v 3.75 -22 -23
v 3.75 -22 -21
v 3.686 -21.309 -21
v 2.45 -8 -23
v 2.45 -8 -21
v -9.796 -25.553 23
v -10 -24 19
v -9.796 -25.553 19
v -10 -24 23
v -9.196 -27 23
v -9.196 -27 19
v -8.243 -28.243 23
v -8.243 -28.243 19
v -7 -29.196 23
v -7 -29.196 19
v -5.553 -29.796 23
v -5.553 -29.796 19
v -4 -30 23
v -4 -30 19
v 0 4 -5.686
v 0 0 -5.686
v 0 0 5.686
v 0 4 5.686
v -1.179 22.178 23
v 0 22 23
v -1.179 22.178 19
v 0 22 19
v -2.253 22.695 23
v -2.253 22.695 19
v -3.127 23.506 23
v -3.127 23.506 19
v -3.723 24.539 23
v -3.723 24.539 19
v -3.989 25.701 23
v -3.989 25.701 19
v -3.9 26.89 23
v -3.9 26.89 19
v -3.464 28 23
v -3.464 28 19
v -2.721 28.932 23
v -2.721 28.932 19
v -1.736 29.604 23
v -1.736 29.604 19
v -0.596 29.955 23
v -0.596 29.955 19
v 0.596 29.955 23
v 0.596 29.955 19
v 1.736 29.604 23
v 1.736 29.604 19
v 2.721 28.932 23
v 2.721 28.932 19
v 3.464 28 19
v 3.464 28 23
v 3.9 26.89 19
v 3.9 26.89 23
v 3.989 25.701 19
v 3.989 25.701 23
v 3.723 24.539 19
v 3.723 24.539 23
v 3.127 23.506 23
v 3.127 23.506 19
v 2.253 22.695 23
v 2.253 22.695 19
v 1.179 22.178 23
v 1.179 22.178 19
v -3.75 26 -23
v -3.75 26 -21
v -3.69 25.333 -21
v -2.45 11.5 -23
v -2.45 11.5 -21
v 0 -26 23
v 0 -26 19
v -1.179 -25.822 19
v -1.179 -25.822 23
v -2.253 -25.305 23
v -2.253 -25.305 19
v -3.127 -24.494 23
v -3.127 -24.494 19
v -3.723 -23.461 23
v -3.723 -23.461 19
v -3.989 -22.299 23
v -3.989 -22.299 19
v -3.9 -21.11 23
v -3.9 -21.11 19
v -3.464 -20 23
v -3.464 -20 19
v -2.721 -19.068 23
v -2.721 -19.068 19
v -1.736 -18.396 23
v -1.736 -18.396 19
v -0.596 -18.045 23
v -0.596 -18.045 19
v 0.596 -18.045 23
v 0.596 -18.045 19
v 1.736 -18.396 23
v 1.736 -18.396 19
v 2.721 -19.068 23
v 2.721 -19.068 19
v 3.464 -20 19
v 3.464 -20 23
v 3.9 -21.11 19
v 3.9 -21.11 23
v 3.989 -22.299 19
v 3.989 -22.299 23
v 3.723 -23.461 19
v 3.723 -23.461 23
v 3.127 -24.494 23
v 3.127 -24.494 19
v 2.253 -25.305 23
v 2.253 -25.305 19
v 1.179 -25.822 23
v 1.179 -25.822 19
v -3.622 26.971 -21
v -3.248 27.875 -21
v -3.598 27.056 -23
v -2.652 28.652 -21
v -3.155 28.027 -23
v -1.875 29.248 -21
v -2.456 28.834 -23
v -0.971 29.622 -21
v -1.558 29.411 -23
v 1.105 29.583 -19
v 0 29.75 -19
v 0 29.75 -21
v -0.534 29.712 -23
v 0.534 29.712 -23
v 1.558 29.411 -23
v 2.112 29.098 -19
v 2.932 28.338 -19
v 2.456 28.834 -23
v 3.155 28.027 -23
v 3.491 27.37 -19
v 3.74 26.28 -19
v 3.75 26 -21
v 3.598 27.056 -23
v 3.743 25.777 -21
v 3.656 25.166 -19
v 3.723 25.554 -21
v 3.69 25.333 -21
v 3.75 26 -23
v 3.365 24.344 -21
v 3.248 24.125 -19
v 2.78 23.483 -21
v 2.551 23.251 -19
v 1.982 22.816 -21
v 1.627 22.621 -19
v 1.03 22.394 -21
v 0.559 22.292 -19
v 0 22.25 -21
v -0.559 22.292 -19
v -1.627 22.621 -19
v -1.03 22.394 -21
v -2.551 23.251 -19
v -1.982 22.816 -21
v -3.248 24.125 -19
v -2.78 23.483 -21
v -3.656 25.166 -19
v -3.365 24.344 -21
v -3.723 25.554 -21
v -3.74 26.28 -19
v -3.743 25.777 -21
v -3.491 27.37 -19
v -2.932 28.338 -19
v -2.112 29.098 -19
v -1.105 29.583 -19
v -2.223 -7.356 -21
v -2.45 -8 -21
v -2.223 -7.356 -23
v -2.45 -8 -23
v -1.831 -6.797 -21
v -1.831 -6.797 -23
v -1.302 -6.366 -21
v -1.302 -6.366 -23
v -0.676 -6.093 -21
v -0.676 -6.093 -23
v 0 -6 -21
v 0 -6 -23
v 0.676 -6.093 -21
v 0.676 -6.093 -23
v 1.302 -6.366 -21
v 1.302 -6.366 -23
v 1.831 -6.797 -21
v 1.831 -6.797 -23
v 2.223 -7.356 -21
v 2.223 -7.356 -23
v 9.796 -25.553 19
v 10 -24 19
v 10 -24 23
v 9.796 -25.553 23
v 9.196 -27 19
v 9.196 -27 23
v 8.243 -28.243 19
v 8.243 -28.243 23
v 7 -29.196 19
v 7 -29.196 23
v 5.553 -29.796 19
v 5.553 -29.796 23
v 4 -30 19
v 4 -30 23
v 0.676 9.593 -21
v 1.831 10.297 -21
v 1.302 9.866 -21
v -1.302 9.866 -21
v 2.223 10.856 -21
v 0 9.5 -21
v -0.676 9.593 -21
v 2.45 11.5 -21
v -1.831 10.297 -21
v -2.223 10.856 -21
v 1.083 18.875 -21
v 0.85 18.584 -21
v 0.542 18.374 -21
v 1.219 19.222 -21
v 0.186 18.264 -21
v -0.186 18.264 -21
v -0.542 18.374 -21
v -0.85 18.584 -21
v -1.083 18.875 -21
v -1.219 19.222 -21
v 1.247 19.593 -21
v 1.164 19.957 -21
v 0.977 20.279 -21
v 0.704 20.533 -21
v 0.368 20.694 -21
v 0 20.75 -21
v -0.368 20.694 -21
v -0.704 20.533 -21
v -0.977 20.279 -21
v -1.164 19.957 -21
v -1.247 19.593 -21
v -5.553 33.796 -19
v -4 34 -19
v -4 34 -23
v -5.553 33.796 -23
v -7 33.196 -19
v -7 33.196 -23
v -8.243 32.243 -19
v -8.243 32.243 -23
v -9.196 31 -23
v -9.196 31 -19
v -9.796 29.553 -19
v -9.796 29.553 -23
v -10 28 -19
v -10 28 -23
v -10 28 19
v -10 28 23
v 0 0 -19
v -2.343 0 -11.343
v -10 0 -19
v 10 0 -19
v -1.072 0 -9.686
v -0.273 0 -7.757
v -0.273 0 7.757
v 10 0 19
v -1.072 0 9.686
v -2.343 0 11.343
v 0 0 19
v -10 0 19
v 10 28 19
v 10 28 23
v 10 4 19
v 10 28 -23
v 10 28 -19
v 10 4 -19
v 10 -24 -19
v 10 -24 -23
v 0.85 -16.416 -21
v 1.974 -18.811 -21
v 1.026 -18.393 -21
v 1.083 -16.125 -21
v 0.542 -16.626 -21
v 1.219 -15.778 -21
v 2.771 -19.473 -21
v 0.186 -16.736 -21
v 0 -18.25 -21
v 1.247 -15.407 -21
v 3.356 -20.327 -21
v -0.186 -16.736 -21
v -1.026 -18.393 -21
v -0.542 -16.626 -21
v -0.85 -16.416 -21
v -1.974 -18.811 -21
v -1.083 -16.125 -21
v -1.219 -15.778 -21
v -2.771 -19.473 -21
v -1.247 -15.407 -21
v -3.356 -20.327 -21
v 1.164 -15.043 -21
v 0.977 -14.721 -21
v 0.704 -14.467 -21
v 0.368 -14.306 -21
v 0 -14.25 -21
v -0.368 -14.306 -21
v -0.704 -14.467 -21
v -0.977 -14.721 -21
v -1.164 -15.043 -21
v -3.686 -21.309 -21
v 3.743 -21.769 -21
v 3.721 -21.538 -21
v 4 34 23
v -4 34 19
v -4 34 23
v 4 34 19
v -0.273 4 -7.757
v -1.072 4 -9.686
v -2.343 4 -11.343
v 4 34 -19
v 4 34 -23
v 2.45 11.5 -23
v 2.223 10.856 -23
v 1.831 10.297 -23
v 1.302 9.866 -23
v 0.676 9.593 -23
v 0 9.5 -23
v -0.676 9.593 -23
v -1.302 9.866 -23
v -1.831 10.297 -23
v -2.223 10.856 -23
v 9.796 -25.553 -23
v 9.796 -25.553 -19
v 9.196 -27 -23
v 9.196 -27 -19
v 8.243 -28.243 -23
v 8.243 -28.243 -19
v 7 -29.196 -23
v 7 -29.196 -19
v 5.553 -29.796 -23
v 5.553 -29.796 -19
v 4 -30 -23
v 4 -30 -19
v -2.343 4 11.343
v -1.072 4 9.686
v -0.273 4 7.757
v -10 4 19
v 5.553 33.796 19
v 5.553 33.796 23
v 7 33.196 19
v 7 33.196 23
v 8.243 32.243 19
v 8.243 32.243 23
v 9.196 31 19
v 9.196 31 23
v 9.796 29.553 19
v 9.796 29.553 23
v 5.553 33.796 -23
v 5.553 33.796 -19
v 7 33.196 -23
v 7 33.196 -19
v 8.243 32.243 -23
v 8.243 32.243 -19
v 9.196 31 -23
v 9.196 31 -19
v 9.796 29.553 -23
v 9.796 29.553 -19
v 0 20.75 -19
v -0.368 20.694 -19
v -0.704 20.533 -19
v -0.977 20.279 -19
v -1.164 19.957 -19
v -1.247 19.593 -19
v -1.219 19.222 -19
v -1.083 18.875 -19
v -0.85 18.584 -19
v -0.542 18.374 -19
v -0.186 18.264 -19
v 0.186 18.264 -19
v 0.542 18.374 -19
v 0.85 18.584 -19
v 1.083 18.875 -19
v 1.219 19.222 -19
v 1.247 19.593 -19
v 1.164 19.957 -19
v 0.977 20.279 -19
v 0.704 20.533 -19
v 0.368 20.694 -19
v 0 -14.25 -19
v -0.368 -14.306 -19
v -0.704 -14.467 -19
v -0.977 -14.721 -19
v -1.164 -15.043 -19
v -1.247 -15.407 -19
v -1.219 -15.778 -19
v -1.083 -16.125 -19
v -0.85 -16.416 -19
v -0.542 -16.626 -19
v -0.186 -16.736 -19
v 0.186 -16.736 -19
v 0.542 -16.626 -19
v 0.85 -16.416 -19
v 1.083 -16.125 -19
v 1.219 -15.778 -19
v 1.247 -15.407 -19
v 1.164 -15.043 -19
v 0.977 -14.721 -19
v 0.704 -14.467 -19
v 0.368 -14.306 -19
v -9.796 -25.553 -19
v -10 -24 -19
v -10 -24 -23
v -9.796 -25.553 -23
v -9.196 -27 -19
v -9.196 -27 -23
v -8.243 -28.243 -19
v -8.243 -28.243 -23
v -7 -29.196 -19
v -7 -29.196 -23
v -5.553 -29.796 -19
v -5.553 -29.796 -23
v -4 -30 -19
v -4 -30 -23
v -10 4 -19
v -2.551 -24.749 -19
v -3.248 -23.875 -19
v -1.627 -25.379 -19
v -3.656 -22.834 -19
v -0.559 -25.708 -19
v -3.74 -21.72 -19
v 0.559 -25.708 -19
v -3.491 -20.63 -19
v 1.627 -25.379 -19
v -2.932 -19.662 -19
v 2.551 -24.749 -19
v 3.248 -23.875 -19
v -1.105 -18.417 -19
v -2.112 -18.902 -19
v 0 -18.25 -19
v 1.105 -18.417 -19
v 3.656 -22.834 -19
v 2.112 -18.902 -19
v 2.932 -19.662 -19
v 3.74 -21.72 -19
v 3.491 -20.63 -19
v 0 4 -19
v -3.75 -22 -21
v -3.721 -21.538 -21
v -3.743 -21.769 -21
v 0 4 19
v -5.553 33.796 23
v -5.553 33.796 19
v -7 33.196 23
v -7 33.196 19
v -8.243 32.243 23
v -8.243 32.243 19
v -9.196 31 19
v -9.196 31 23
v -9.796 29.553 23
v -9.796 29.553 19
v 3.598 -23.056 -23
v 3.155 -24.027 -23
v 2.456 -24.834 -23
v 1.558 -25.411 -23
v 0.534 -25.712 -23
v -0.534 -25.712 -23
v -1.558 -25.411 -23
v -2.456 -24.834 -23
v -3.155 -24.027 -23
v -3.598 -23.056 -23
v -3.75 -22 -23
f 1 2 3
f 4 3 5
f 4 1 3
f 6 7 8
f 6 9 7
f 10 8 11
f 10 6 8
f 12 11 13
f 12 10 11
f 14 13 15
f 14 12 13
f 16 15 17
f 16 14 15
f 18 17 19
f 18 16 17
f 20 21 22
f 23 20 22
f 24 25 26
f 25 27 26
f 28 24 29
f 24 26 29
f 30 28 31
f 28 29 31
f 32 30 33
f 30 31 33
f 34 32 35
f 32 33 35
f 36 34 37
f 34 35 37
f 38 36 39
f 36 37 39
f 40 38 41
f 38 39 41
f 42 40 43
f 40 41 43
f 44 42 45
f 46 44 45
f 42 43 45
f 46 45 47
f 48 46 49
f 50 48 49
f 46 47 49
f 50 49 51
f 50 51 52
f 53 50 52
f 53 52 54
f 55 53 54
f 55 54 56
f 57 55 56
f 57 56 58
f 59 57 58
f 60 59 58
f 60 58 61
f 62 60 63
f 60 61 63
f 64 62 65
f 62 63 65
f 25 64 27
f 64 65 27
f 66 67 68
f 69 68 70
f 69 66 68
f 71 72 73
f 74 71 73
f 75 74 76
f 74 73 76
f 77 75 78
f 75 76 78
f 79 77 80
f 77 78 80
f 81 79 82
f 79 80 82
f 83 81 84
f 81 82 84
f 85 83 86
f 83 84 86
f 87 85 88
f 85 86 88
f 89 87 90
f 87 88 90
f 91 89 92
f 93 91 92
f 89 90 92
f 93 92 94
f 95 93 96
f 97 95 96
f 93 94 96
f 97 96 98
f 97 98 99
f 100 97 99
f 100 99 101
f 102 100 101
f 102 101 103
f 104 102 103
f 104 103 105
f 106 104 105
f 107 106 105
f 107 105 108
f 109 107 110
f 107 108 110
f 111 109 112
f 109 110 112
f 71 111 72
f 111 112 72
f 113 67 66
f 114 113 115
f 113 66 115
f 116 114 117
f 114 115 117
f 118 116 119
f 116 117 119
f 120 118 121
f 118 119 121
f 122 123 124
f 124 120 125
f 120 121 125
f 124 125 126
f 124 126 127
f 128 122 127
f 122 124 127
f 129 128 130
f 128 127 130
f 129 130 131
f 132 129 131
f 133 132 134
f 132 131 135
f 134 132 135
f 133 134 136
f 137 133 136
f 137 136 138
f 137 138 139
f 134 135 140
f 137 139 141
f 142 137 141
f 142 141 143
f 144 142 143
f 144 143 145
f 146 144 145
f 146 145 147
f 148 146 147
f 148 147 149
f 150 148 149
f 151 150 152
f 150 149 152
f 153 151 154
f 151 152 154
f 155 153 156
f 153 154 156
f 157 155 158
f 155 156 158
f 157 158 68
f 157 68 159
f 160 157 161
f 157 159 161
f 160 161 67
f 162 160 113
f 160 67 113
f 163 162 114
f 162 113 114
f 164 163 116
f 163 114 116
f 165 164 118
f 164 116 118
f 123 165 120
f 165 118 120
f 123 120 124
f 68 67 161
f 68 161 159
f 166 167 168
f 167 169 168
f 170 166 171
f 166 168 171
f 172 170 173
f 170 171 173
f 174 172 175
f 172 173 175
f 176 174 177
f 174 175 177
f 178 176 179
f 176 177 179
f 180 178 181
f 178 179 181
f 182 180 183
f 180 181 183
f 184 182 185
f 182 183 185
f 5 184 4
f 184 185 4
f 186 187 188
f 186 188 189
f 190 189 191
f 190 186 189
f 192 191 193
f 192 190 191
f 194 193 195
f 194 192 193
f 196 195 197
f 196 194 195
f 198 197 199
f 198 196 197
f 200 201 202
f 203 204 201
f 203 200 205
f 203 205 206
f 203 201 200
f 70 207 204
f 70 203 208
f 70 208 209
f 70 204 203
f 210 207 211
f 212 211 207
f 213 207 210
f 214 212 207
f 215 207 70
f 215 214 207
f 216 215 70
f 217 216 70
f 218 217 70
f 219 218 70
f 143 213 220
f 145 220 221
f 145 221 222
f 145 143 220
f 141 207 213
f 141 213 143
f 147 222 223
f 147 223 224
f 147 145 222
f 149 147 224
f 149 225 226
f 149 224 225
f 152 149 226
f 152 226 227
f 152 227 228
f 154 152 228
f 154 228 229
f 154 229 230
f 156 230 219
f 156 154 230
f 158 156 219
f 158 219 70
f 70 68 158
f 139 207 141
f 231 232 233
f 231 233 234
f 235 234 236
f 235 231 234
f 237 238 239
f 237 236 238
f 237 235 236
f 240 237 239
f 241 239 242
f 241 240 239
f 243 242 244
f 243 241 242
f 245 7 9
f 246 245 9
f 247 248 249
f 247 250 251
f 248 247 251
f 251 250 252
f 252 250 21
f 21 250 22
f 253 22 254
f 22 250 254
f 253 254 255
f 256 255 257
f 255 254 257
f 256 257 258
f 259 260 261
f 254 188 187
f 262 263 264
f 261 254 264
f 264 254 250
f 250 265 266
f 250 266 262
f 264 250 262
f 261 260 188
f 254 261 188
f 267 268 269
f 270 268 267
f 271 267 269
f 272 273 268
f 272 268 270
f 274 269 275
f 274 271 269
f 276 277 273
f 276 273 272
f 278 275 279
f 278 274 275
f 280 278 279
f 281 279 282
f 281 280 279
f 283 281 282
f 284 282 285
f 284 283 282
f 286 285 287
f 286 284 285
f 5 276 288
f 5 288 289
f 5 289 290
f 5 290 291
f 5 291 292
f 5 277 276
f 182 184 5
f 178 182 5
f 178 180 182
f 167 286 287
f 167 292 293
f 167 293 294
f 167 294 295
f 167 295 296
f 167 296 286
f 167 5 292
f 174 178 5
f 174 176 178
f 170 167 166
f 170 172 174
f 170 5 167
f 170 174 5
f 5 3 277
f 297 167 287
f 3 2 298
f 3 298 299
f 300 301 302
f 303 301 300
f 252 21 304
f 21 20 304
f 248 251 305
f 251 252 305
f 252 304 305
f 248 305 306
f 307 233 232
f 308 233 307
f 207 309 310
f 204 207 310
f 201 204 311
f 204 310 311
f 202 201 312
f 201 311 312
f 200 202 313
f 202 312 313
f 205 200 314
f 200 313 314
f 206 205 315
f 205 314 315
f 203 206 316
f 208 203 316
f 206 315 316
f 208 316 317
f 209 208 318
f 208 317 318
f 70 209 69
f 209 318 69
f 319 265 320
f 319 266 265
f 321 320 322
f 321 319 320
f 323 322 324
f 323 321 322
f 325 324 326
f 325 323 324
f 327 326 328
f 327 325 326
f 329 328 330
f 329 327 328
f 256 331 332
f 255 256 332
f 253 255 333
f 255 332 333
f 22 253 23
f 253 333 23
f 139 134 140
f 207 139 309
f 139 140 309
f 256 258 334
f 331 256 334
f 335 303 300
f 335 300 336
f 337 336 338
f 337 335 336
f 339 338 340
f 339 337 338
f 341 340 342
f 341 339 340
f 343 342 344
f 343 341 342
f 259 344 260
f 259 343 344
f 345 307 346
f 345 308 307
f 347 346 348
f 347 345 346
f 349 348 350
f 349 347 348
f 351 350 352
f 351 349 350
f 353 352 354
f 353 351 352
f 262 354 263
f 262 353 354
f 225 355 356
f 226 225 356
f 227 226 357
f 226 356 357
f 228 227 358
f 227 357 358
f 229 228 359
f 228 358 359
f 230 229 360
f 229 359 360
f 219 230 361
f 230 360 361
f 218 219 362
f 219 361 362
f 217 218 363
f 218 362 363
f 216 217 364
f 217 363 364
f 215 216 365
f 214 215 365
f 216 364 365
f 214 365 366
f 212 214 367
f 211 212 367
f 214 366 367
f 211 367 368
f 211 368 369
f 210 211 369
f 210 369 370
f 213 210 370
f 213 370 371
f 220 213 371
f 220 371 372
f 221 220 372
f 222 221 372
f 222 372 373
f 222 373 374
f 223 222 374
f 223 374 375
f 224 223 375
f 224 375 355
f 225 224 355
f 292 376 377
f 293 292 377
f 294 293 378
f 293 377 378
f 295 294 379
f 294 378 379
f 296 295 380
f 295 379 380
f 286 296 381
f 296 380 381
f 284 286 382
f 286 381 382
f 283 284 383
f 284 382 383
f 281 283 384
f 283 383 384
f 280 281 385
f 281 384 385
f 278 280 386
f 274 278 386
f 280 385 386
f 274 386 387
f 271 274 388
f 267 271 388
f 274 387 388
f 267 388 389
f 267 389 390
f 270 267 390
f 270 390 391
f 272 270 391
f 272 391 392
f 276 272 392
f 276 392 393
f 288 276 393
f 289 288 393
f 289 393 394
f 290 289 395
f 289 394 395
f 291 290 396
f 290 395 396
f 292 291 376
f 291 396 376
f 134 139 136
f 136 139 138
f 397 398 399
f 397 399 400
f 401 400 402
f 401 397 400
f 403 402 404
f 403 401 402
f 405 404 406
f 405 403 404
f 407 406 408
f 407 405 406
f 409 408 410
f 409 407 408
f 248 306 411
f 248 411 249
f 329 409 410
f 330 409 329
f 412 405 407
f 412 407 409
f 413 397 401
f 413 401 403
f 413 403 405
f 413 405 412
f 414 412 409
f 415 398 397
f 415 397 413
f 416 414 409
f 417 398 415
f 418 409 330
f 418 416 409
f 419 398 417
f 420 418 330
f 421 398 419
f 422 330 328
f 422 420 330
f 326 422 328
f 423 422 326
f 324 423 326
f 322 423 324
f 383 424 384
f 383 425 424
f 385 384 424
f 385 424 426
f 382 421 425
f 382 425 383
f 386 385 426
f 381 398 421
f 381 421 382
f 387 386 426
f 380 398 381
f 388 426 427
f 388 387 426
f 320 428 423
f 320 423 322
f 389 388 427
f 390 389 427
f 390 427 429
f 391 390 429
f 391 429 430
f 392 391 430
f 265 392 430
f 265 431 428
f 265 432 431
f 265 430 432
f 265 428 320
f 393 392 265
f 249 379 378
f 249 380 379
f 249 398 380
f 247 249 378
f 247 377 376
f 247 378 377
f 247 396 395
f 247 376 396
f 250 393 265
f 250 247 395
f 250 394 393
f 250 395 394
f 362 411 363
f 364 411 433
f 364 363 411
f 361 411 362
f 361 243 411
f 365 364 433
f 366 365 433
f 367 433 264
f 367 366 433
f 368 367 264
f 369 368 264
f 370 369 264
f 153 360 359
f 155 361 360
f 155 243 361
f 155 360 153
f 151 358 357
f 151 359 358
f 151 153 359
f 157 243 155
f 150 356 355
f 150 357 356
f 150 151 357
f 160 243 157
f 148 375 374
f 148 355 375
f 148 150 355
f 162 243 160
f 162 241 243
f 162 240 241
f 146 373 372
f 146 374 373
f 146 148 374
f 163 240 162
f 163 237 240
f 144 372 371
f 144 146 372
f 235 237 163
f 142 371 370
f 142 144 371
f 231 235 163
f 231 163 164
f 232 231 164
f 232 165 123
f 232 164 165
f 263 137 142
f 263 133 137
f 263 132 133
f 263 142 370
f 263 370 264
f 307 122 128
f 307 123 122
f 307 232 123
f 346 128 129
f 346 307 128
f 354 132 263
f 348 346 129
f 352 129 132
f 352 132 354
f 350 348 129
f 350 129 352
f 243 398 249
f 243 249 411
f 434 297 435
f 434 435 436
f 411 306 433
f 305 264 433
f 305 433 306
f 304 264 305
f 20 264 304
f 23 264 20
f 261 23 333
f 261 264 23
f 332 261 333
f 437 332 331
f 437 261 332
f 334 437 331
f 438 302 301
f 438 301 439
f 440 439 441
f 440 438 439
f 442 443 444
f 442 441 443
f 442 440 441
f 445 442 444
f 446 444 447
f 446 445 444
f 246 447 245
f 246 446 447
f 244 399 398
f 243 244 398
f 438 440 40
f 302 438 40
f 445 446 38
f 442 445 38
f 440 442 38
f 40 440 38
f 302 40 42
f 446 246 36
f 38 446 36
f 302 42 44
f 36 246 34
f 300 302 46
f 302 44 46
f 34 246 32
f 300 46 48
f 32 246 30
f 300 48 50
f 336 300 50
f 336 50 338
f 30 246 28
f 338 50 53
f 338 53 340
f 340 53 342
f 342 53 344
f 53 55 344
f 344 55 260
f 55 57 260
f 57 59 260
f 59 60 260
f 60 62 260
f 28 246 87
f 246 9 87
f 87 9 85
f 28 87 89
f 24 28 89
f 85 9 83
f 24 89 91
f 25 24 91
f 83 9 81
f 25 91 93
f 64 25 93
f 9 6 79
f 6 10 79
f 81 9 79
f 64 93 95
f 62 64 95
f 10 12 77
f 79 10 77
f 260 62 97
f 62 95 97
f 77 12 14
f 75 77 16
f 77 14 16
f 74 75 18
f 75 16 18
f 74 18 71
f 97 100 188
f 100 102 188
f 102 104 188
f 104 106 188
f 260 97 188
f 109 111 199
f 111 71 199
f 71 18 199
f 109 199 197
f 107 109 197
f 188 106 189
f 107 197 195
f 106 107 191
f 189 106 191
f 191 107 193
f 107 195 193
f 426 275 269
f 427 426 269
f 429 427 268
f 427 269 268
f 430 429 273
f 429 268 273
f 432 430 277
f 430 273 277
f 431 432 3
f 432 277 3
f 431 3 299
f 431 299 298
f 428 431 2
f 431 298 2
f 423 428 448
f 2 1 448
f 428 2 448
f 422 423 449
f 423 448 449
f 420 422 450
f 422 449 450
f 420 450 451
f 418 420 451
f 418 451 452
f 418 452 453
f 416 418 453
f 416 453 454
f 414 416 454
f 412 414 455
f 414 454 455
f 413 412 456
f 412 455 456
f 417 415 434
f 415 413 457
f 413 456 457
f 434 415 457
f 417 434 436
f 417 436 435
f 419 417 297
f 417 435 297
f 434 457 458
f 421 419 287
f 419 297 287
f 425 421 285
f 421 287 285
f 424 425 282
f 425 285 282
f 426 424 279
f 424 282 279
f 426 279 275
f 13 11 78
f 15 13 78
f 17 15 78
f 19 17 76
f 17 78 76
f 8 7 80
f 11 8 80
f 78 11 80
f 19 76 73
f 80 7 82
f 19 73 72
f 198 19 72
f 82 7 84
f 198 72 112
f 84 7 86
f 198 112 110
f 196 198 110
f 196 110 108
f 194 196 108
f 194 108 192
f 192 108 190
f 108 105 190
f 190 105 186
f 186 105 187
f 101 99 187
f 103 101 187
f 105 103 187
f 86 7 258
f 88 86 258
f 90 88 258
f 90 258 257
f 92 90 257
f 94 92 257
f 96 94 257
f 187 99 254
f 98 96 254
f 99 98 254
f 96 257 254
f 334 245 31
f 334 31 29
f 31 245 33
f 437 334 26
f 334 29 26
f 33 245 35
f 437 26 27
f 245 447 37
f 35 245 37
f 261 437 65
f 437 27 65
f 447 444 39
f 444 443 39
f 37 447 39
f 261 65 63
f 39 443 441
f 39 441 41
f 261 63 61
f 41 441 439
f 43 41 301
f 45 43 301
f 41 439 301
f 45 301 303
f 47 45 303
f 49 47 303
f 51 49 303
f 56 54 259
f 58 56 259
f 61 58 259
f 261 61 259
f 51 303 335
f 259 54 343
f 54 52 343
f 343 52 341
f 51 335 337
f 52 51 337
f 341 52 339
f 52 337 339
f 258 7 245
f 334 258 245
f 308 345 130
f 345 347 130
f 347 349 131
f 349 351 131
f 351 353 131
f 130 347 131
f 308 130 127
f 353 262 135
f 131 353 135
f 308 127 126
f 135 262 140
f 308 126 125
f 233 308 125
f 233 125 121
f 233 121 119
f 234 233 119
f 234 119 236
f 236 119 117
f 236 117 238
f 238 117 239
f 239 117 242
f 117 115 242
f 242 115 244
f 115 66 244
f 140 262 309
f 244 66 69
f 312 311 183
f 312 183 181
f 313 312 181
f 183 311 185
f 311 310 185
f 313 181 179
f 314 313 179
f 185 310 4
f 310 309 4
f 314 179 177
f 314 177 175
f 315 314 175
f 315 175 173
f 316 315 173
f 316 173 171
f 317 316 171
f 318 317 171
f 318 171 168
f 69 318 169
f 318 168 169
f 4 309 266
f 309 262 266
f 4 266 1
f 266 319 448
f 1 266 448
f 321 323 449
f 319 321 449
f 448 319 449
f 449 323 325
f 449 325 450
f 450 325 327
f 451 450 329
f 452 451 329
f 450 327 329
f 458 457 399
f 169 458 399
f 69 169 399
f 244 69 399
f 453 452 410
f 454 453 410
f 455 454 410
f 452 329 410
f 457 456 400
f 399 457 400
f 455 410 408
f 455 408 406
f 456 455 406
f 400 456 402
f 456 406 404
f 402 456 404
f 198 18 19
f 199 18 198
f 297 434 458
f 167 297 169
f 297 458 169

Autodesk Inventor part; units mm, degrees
ref_plane "YZ Plane" through (0, 0, 0) normal (1, 0, 0) x (0, 1, 0)
ref_plane "XZ Plane" through (0, 0, 0) normal (0, 1, 0) x (-1, 0, 0)
ref_plane "XY Plane" through (0, 0, 0) normal (0, 0, 1) x (1, 0, 0)
sketch "Sketch1" plane through (0, 0, 0) normal (0, 1, 0) x (-1, 0, 0)
  line L0 (14, 0) -> (-14, 0) projected
  line L1 (0, -32.2) -> (0, 32.2) projected
  line L2 (10, 23) -> (-10, 23)
  line L3 (-10, 23) -> (-10, -23)
  line L4 (-10, -23) -> (10, -23)
  line L5 (10, -23) -> (10, 23)
  point P0 (0, 0)
  dimension "d0" = 46
  dimension "d1" = 20
extrude "Extrusion1" add sketch "Sketch1" along normal blind 4
sketch "Sketch2" plane through (0, 4, 0) normal (0, 1, 0) x (1, 0, 0)
  line L0 (-10, -23) -> (10, -23) projected
  line L1 (10, -23) -> (10, 23) projected
  line L2 (10, 23) -> (-10, 23) projected
  line L3 (-10, 23) -> (-10, -23) projected
  line L4 (-10, -23) -> (10, -23)
  line L5 (10, -23) -> (10, -19)
  line L6 (10, -19) -> (-10, -19)
  line L7 (-10, -19) -> (-10, -23)
  line L8 (-10, 19) -> (10, 19)
  line L9 (10, 19) -> (10, 23)
  line L10 (10, 23) -> (-10, 23)
  line L11 (-10, 23) -> (-10, 19)
  line L12 (-10, -23) -> (10, -23) projected
  line L13 (-10, 23) -> (-10, -23) projected
  line L14 (10, -23) -> (10, 23) projected
  line L15 (10, 23) -> (-10, 23) projected
  point P0 (0, 0)
  dimension "d4" = 4
  dimension "d5" = 4
extrude "Extrusion2" add sketch "Sketch2" along normal blind 30 contours L3 L6 L1 L0 | L3 L2 L1 L8
sketch "Sketch4" plane through (-10, 0, 23) normal (0, 0, 1) x (1, 0, 0)
  line L0 (0, 0) -> (20, 0) projected
  line L1 (20, 0) -> (20, 34) projected
  line L2 (0, 34) -> (20, 34) projected
  line L3 (0, 0) -> (0, 34) projected
  point P0 (10, 0)
  point P1 (10, 26)
  dimension "d8" = 10
  dimension "d9" = 8
hole "Hole1" at (0, 26, 23) direction (0, 0, -1) diameter 8 depth 42
sketch "Sketch10" plane through (10, 0, -23) normal (0, 0, -1) x (-1, 0, 0)
  line L0 (0, 34) -> (20, 34) projected
  line L1 (0, 0) -> (0, 34) projected
  line L2 (0, 0) -> (20, 0) projected
  line L3 (20, 0) -> (20, 34) projected
  circle A0 centre (10, 26) radius 4 projected
  circle A1 centre (10, 26) radius 3.75
  circle A2 centre (10, 12) radius 2.5
  line L4 (-6.7241, 9.5) -> (37.2046, 9.5) construction
  line L5 (6.25, 26) -> (7.5505, 11.5)
  line L6 (13.75, 26) -> (12.4495, 11.5)
  point P0 (10, 0)
  dimension "d47" = 16.5
  dimension "d48" = 7.5
  dimension "d49" = 5
  dimension "d50" = 10
  dimension "d51" = 2
  dimension "d52" = 2
  dimension "d53" = 8
  dimension "d54" = 8
extrude "Extrusion4" cut sketch "Sketch10" against normal blind 2 contours L5 A1 L6 A0 | A0 L6 A2 L5 | L5 A1 L6 | A2 L6 L5 picked at (10.4522, 22.2104)
sketch "Sketch11" plane through (10, 0, -21) normal (0, 0, -1) x (-1, 0, 0)
  line L0 (7.5505, 11.5) -> (6.25, 26) projected
  arc A0 (7.5505, 11.5) -> (12.4495, 11.5) centre (10, 12) ccw projected
  line L1 (13.75, 26) -> (12.4495, 11.5) projected
  arc A1 (13.75, 26) -> (6.25, 26) centre (10, 26) ccw projected
  point P0 (10, 0)
hole "Hole4" at (0, 26, -21) direction (0, 0, 1) diameter 7.5 depth 40
sketch "Sketch12" plane through (10, 0, -21) normal (0, 0, -1) x (-1, 0, 0)
  arc A0 (6.3099, 25.3327) -> (13.6901, 25.3327) centre (10, 26) ccw projected
  line L0 (7.5505, 11.5) -> (6.3099, 25.3327) projected
  arc A1 (7.5505, 11.5) -> (12.4495, 11.5) centre (10, 12) ccw projected
  line L1 (13.6901, 25.3327) -> (12.4495, 11.5) projected
  line L2 (0, 0) -> (0, 34) projected
  point P0 (10, 0)
  point P1 (10, 19.5)
  point P2 (0, 28)
  dimension "d64" = 6.5
  dimension "d65" = 10
hole "Hole5" at (0, 19.5, -21) direction (0, 0, 1) diameter 2.5 depth 40
sketch "Sketch13" plane through (0, 0, 0) normal (0, -1, 0) x (1, 0, 0)
  line L0 (-10, 23) -> (10, 23) projected
  line L1 (-10, -23) -> (-10, 23) projected
  line L2 (10, -23) -> (-10, -23) projected
  line L3 (10, 23) -> (10, -23) projected
  line L4 (10, 23) -> (10, -23) projected
  line L5 (-10, -19) -> (-10, 19) projected
  line L6 (10, 23) -> (-10, 23)
  line L7 (-10, 23) -> (-10, 19)
  line L8 (-10, 19) -> (10, 19)
  line L9 (10, 19) -> (10, 23)
  line L10 (10, -23) -> (-10, -23)
  line L11 (-10, -23) -> (-10, -19)
  line L12 (-10, -19) -> (10, -19)
  line L13 (10, -19) -> (10, -23)
  point P0 (0, 0)
extrude "Extrusion5" add sketch "Sketch13" along normal blind 30 contours L0 L3 L8 L1 | L12 L3 L2 L1
sketch "Sketch14" plane through (10, 34, -23) normal (0, 0, -1) x (-1, 0, 0)
  arc A0 (7.5505, -22.5) -> (12.4495, -22.5) centre (10, -22) ccw projected
  line L0 (7.5505, -22.5) -> (6.25, -8) projected
  arc A1 (13.75, -8) -> (6.25, -8) centre (10, -8) ccw projected
  line L1 (13.75, -8) -> (12.4495, -22.5) projected
  line L2 (20, -64) -> (20, 0) projected
  line L3 (0, 0) -> (20, 0) projected
  line L4 (0, -64) -> (0, 0) projected
  line L5 (20, -64) -> (0, -64) projected
  line L6 (0, -34) -> (0, -64) projected
  line L7 (0, -40) -> (20, -40) construction
  circle A2 centre (10, -56) radius 3.75
  circle A3 centre (10, -42.5) radius 2.5
  line L8 (6.25, -56) -> (7.5505, -42)
  line L9 (13.75, -56) -> (12.4495, -42)
  point P0 (10, -34)
  dimension "d77" = 8
  dimension "d78" = 10
  dimension "d79" = 7.5
  dimension "d80" = 16
  dimension "d81" = 5
  dimension "d82" = 10
  dimension "d85" = 2
  dimension "d86" = 8
  dimension "d87" = 2
  dimension "d88" = 8
extrude "Extrusion6" cut sketch "Sketch14" against normal blind 2 contours L8 A2 L9 | L8 A3 L9 A2 | L8 A3 L9
sketch "Sketch15" plane through (10, 34, -21) normal (0, 0, -1) x (-1, 0, 0)
  arc A0 (6.25, -56) -> (13.75, -56) centre (10, -56) ccw projected
  line L0 (12.4495, -42) -> (13.75, -56) projected
  arc A1 (12.4495, -42) -> (7.5505, -42) centre (10, -42.5) ccw projected
  line L1 (6.25, -56) -> (7.5505, -42) projected
  point P0 (10, -34)
hole "Hole6" at (0, -22, -21) direction (0, 0, 1) diameter 7.5 depth 40
sketch "Sketch16" plane through (10, 34, -21) normal (0, 0, -1) x (-1, 0, 0)
  arc A0 (13.6858, -55.3093) -> (6.3142, -55.3093) centre (10, -56) ccw projected
  line L0 (12.4495, -42) -> (13.6858, -55.3093) projected
  arc A1 (12.4495, -42) -> (7.5505, -42) centre (10, -42.5) ccw projected
  line L1 (6.3142, -55.3093) -> (7.5505, -42) projected
  line L2 (12.4495, -42) -> (13.75, -56) projected
  arc A2 (6.25, -56) -> (13.75, -56) centre (10, -56) ccw projected
  line L3 (6.25, -56) -> (7.5505, -42) projected
  arc A3 (12.4495, -42) -> (7.5505, -42) centre (10, -42.5) ccw projected
  arc A4 (7.5505, -22.5) -> (12.4495, -22.5) centre (10, -22) ccw projected
  line L4 (7.5505, -22.5) -> (6.25, -8) projected
  arc A5 (13.75, -8) -> (6.25, -8) centre (10, -8) ccw projected
  line L5 (13.75, -8) -> (12.4495, -22.5) projected
  line L6 (20, -64) -> (20, 0) projected
  line L7 (0, 0) -> (20, 0) projected
  line L8 (0, -64) -> (0, 0) projected
  line L9 (20, -64) -> (0, -64) projected
  point P0 (10, -34)
  point P1 (10, -49.5)
  dimension "d98" = 10
  dimension "d99" = 6.5
hole "Hole7" at (0, -15.5, -21) direction (0, 0, 1) diameter 2.5 end up to surface
sketch "Sketch17" plane through (-10, 34, 23) normal (0, 0, 1) x (1, 0, 0)
  line L0 (20, -64) -> (0, -64) projected
  line L1 (20, -64) -> (20, 0) projected
  point P0 (10, -34)
  point P1 (10, -56)
  dimension "d107" = 8
  dimension "d108" = 10
hole "Hole8" at (0, -22, 23) direction (0, 0, -1) diameter 8 depth 4
fillet "Fillet4" radius 6 8 edges at (10, -30, -21) (-10, -30, -21) (10, -30, 21) (-10, -30, 21) (10, 34, 21) (10, 34, -21) (-10, 34, -21) (-10, 34, 21)
sketch "Sketch19" plane through (0, 0, 0) normal (0, -1, 0) x (1, 0, 0)
  line L0 (10, 19) -> (-10, 19) projected
  line L1 (-10, -19) -> (-10, 19) projected
  line L2 (-10, -19) -> (10, -19) projected
  line L3 (10, 19) -> (10, -19) projected
  line L4 (-10, -19) -> (-10, 19) projected
  line L5 (10, 19) -> (-10, 19) projected
  line L6 (-10, -19) -> (0, -19)
  line L7 (0, -19) -> (0, 19)
  line L8 (0, 19) -> (-10, 19)
  line L9 (-10, 19) -> (-10, -19)
  point P0 (0, 0)
extrude "Extrusion8" cut sketch "Sketch19" against normal up to next contours L7 L2 L1 L0
chamfer "Chamfer1" distance 10 angle 45 2 edges at (0, 2, -19) (0, 2, 19)
fillet "Fillet6" radius 8 2 edges at (0, 2, 9) (0, 2, -9)
properties part number "v5_femur"
